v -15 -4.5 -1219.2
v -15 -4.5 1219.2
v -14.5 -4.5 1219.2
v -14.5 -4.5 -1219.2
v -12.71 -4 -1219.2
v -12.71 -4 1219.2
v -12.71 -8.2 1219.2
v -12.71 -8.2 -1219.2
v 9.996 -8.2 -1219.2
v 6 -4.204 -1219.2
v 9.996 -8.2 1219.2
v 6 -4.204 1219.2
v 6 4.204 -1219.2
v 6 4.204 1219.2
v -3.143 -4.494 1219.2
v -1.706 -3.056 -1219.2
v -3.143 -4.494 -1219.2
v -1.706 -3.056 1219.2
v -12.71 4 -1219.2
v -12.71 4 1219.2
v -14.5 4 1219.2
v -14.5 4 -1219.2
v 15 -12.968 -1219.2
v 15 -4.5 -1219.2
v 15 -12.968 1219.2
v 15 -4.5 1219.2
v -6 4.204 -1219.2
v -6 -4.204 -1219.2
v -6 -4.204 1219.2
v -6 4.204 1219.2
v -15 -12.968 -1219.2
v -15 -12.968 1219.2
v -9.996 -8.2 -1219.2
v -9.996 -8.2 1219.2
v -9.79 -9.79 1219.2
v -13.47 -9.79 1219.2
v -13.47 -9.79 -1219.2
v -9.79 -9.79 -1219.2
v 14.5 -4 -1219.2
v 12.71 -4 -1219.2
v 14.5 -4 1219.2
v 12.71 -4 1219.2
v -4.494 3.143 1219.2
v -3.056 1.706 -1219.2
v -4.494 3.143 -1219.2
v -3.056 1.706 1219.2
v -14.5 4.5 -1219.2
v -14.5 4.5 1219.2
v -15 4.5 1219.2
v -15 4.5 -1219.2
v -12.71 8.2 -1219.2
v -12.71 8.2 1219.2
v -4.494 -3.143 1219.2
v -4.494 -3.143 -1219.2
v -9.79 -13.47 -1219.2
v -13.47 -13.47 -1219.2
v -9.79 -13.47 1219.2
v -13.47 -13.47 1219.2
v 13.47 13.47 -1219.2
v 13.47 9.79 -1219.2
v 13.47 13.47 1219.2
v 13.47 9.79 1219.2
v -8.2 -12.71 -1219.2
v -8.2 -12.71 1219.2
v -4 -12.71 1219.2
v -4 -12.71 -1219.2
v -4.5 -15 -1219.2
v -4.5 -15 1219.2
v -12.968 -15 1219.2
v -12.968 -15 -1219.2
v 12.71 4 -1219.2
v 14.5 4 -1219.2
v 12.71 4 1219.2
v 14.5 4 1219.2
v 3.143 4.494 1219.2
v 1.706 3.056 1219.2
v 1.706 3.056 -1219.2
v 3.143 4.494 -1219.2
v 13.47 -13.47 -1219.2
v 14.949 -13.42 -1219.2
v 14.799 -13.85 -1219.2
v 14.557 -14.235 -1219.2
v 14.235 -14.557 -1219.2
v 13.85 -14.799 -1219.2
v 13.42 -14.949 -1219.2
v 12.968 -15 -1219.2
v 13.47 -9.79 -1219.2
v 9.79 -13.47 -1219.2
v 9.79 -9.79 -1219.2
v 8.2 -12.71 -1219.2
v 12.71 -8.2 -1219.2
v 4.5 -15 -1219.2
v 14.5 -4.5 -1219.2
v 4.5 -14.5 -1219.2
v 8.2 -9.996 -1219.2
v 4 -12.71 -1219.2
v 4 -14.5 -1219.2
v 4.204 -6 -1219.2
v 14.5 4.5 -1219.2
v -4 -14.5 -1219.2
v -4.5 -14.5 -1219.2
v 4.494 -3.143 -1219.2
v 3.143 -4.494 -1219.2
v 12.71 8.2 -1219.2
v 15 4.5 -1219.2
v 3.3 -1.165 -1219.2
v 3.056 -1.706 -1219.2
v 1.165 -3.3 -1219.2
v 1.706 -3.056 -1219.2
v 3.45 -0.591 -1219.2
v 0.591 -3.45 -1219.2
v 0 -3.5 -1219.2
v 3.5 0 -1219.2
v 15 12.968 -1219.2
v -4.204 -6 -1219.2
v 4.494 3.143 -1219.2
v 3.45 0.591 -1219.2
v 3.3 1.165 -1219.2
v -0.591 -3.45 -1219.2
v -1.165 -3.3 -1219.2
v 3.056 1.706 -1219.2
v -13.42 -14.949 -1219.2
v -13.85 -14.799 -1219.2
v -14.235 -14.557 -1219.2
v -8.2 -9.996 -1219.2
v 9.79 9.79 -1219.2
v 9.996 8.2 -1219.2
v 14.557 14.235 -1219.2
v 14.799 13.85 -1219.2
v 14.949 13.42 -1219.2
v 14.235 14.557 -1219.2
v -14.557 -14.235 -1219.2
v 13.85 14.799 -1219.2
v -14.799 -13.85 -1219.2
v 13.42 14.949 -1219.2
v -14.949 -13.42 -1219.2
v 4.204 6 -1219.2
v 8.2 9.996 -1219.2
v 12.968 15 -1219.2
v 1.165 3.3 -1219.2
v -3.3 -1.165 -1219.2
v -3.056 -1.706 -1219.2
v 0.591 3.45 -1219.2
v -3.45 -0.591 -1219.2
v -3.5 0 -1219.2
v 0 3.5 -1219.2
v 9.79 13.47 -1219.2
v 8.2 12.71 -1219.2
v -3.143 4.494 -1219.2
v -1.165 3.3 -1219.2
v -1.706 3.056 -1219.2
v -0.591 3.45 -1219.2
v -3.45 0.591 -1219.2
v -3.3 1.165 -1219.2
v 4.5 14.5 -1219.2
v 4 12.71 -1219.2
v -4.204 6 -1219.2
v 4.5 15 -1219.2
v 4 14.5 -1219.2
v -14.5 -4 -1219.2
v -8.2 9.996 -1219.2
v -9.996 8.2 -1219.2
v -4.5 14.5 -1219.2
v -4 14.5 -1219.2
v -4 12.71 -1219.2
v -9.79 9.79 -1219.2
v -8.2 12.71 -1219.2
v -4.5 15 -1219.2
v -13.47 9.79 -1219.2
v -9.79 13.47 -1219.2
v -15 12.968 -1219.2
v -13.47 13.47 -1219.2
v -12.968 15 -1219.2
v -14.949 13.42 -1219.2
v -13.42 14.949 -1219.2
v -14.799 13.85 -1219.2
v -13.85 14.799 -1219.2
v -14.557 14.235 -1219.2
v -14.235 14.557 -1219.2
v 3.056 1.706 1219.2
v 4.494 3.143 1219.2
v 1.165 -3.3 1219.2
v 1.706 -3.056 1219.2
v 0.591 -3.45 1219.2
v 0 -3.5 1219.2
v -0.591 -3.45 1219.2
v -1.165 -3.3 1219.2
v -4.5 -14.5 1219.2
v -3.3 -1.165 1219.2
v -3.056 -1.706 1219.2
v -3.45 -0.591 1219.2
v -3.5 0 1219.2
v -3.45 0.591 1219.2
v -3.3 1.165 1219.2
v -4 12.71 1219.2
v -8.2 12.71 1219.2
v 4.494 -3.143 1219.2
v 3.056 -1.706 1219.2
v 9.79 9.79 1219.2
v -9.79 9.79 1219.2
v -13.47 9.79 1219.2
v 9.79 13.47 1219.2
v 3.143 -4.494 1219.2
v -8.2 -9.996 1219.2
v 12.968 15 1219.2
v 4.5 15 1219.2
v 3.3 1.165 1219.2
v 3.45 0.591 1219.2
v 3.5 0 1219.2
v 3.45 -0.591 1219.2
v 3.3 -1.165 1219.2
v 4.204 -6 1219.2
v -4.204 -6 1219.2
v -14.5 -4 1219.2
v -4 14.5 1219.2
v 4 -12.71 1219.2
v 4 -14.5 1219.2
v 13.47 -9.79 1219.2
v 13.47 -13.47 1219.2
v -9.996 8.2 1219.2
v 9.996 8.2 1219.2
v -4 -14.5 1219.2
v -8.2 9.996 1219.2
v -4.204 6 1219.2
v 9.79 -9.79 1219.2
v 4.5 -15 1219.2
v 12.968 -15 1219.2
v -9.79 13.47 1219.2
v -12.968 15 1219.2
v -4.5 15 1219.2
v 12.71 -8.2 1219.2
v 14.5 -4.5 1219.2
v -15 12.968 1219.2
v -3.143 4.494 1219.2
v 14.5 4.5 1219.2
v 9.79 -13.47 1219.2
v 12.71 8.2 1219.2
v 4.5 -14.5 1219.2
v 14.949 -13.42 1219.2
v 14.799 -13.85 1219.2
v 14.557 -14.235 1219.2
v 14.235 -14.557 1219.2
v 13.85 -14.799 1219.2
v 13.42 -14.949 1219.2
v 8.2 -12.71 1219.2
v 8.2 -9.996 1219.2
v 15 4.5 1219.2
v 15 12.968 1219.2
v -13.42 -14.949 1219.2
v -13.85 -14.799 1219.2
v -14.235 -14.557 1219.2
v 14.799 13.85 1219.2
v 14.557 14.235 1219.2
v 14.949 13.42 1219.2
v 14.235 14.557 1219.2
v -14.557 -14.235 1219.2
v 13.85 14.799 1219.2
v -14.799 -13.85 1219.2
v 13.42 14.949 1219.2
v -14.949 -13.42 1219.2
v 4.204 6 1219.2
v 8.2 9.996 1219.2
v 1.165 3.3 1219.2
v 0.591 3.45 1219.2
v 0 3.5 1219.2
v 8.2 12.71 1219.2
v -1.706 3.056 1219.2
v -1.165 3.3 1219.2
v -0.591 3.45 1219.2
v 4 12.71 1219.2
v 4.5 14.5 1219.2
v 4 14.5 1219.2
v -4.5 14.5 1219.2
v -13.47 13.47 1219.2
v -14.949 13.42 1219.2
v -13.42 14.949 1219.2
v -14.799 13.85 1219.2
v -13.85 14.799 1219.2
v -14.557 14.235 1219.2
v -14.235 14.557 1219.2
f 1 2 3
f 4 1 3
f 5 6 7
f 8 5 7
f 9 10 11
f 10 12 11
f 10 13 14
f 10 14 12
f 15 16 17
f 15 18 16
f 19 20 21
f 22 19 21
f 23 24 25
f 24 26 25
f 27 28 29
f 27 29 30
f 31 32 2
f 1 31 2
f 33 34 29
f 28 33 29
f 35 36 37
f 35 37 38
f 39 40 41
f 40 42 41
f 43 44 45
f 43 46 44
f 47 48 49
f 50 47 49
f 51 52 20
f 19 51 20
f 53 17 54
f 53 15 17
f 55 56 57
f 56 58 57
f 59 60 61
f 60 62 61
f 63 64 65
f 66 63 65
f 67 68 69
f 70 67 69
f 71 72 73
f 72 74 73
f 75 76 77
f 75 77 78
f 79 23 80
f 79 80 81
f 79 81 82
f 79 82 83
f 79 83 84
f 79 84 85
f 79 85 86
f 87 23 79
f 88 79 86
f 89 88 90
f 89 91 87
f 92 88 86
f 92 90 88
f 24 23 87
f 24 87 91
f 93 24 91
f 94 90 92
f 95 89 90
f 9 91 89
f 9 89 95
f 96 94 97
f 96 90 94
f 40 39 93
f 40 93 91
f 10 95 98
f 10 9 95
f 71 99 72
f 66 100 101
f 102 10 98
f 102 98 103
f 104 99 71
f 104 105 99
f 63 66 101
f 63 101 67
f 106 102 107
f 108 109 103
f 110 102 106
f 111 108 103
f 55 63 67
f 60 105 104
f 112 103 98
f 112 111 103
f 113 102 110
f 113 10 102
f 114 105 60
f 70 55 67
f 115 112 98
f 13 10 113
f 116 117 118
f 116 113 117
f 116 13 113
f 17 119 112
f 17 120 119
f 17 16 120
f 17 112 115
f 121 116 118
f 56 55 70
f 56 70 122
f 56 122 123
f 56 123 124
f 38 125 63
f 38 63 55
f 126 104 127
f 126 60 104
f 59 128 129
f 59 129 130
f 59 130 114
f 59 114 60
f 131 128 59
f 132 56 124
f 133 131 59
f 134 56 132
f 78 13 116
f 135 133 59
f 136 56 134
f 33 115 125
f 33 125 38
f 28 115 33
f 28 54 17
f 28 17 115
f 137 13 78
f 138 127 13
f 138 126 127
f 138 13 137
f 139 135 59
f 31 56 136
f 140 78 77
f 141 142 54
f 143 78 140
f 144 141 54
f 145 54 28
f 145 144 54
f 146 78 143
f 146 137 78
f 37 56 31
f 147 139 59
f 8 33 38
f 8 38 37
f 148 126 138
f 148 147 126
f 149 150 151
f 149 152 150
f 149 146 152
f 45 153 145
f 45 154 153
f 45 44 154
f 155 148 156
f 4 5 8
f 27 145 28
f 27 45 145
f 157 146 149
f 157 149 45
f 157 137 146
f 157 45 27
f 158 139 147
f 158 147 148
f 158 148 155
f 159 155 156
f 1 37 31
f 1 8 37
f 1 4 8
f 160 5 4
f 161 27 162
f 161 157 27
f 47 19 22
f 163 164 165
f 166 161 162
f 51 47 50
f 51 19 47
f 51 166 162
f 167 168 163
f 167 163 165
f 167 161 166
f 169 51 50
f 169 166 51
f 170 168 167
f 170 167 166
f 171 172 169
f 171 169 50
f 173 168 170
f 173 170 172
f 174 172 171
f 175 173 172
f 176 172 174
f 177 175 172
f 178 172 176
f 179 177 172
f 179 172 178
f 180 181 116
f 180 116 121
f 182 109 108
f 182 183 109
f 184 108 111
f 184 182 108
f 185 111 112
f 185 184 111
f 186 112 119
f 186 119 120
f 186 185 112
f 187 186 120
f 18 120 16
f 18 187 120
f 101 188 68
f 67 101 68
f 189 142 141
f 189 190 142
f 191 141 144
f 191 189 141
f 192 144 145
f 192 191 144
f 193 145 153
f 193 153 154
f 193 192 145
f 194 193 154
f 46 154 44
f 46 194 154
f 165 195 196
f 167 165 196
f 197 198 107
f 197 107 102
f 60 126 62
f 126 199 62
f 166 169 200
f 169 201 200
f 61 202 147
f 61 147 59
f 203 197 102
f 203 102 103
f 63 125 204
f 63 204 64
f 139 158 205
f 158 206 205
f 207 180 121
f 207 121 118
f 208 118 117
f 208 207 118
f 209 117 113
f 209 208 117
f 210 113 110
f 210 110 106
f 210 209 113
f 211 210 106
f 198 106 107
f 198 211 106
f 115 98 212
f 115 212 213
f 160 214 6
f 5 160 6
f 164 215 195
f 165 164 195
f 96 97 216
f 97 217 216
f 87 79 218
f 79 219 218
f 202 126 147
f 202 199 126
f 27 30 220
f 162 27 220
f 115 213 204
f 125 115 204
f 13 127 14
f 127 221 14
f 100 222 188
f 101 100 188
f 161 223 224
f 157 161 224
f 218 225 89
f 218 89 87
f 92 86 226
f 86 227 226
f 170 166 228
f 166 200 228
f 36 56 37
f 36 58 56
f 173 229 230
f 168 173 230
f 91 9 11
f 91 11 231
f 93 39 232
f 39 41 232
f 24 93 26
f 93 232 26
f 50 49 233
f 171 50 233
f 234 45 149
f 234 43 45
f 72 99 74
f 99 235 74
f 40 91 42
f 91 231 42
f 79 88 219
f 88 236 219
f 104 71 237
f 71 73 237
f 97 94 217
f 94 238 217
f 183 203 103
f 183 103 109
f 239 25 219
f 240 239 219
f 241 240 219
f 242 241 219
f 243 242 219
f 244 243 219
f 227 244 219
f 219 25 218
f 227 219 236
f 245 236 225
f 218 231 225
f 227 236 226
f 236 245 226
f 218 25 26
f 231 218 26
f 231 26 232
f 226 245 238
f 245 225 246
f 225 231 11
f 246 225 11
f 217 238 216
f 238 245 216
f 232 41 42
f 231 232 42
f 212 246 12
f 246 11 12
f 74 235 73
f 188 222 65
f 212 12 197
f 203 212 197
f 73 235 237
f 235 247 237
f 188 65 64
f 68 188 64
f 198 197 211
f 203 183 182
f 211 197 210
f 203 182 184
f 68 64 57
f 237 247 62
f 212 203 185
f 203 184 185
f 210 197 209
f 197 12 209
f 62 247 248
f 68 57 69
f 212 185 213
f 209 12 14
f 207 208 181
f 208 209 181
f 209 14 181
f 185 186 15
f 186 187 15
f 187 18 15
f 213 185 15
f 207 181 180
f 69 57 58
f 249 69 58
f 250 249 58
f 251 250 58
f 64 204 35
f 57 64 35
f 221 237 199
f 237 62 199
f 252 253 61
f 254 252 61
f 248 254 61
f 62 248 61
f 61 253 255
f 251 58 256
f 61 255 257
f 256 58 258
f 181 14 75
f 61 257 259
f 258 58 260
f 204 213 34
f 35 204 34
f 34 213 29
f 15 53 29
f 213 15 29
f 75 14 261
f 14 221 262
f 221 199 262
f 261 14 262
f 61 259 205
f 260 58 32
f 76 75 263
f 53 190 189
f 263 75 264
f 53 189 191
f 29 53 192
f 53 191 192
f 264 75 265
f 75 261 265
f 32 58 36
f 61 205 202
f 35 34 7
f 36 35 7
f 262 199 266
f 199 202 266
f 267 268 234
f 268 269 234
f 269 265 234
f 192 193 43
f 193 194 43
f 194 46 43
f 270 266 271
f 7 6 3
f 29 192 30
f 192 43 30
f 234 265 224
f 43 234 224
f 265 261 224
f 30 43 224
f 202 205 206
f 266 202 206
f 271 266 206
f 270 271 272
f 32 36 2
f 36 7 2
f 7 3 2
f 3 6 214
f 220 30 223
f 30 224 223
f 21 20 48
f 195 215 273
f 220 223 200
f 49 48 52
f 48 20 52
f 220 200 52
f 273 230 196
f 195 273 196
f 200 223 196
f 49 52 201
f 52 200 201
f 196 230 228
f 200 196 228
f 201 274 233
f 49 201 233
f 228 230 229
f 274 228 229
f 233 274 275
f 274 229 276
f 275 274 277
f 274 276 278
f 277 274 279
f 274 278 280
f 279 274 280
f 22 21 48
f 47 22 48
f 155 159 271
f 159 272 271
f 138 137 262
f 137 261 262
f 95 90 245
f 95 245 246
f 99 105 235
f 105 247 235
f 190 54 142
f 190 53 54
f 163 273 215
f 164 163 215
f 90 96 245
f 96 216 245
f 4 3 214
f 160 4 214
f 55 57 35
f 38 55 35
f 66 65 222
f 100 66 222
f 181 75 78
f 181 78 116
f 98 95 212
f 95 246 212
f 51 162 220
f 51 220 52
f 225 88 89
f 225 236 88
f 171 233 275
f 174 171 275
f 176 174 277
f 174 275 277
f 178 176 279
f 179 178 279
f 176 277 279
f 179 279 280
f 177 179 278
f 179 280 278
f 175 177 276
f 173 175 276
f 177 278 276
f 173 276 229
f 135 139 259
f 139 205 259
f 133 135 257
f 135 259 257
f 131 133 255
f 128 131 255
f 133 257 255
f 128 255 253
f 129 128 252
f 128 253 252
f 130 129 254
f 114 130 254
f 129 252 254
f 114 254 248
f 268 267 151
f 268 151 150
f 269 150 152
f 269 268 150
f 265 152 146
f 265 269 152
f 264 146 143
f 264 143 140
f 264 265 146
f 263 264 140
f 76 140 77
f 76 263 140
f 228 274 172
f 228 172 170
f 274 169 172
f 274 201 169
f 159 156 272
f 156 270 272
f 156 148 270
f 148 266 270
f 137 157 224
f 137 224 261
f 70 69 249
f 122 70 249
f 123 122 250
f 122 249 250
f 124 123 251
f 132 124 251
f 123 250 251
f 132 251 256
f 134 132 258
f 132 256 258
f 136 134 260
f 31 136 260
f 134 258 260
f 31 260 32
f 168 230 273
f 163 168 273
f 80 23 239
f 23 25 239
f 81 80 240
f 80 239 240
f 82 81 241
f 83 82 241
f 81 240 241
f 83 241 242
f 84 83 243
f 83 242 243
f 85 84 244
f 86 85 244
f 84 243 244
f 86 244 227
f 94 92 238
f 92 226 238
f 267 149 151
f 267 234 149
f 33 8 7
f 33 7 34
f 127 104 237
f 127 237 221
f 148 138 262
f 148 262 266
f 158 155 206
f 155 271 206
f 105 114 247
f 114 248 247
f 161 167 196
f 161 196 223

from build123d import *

# Parameters (mm, degrees)
SKETCH3_W           = 3.68
SKETCH3_H           = 3.68
BOSS_EXTRUDE1_DEPTH = 1219.2


with BuildPart() as part:
    # Sketch3 → Boss-Extrude1 (new, symmetric)
    with BuildSketch(Plane.XY):
        with BuildLine():
            Line((-4.203948776, 6), (0, 6))
            Line((0, 6), (4.203948776, 6))
            Line((4.203948776, 6), (8.2, 9.996051224))
            Line((8.2, 9.996051224), (8.2, 12.71))
            Line((8.2, 12.71), (4, 12.71))
            Line((4, 12.71), (4, 14.5))
            Line((4, 14.5), (4.5, 14.5))
            Line((4.5, 14.5), (4.5, 15))
            Line((4.5, 15), (12.968, 15))
            ThreePointArc((12.968, 15), (14.404840979, 14.404840979), (15, 12.968))
            Line((15, 12.968), (15, 4.5))
            Line((15, 4.5), (14.5, 4.5))
            Line((14.5, 4.5), (14.5, 4))
            Line((14.5, 4), (12.71, 4))
            Line((12.71, 4), (12.71, 8.2))
            Line((12.71, 8.2), (9.996051224, 8.2))
            Line((9.996051224, 8.2), (6, 4.203948776))
            Line((6, 4.203948776), (6, 0))
            Line((6, 0), (6, -4.203948776))
            Line((6, -4.203948776), (9.996051224, -8.2))
            Line((9.996051224, -8.2), (12.71, -8.2))
            Line((12.71, -8.2), (12.71, -4))
            Line((12.71, -4), (14.5, -4))
            Line((14.5, -4), (14.5, -4.5))
            Line((14.5, -4.5), (15, -4.5))
            Line((15, -4.5), (15, -12.968))
            ThreePointArc((15, -12.968), (14.404840979, -14.404840979), (12.968, -15))
            Line((12.968, -15), (4.5, -15))
            Line((4.5, -15), (4.5, -14.5))
            Line((4.5, -14.5), (4, -14.5))
            Line((4, -14.5), (4, -12.71))
            Line((4, -12.71), (8.2, -12.71))
            Line((8.2, -12.71), (8.2, -9.996051224))
            Line((8.2, -9.996051224), (4.203948776, -6))
            Line((4.203948776, -6), (0, -6))
            Line((0, -6), (-4.203948776, -6))
            Line((-4.203948776, -6), (-8.2, -9.996051224))
            Line((-8.2, -9.996051224), (-8.2, -12.71))
            Line((-8.2, -12.71), (-4, -12.71))
            Line((-4, -12.71), (-4, -14.5))
            Line((-4, -14.5), (-4.5, -14.5))
            Line((-4.5, -14.5), (-4.5, -15))
            Line((-4.5, -15), (-12.968, -15))
            ThreePointArc((-12.968, -15), (-14.404840979, -14.404840979), (-15, -12.968))
            Line((-15, -12.968), (-15, -4.5))
            Line((-15, -4.5), (-14.5, -4.5))
            Line((-14.5, -4.5), (-14.5, -4))
            Line((-14.5, -4), (-12.71, -4))
            Line((-12.71, -4), (-12.71, -8.2))
            Line((-12.71, -8.2), (-9.996051224, -8.2))
            Line((-9.996051224, -8.2), (-6, -4.203948776))
            Line((-6, -4.203948776), (-6, 0))
            Line((-6, 0), (-6, 4.203948776))
            Line((-6, 4.203948776), (-9.996051224, 8.2))
            Line((-9.996051224, 8.2), (-12.71, 8.2))
            Line((-12.71, 8.2), (-12.71, 4))
            Line((-12.71, 4), (-14.5, 4))
            Line((-14.5, 4), (-14.5, 4.5))
            Line((-14.5, 4.5), (-15, 4.5))
            Line((-15, 4.5), (-15, 12.968))
            ThreePointArc((-15, 12.968), (-14.404840979, 14.404840979), (-12.968, 15))
            Line((-12.968, 15), (-4.5, 15))
            Line((-4.5, 15), (-4.5, 14.5))
            Line((-4.5, 14.5), (-4, 14.5))
            Line((-4, 14.5), (-4, 12.71))
            Line((-4, 12.71), (-8.2, 12.71))
            Line((-8.2, 12.71), (-8.2, 9.996051224))
            Line((-8.2, 9.996051224), (-4.203948776, 6))
        make_face()
        with Locations((-11.63, 11.63)):
            Rectangle(SKETCH3_W, SKETCH3_H, mode=Mode.SUBTRACT)
        with BuildLine():
            Line((-3.143089642, 4.493663594), (-1.705676589, 3.056250541))
            ThreePointArc((-1.705676589, 3.056250541), (0, 3.5), (1.705676589, 3.056250541))
            Line((1.705676589, 3.056250541), (3.143089642, 4.493663594))
            Line((3.143089642, 4.493663594), (4.493663594, 3.143089642))
            Line((4.493663594, 3.143089642), (3.056250541, 1.705676589))
            ThreePointArc((3.056250541, 1.705676589), (3.5, 0), (3.056250541, -1.705676589))
            Line((3.056250541, -1.705676589), (4.493663594, -3.143089642))
            Line((4.493663594, -3.143089642), (3.143089642, -4.493663594))
            Line((3.143089642, -4.493663594), (1.705676589, -3.056250541))
            ThreePointArc((1.705676589, -3.056250541), (0, -3.5), (-1.705676589, -3.056250541))
            Line((-1.705676589, -3.056250541), (-3.143089642, -4.493663594))
            Line((-3.143089642, -4.493663594), (-4.493663594, -3.143089642))
            Line((-4.493663594, -3.143089642), (-3.056250541, -1.705676589))
            ThreePointArc((-3.056250541, -1.705676589), (-3.5, 0), (-3.056250541, 1.705676589))
            Line((-3.056250541, 1.705676589), (-4.493663594, 3.143089642))
            Line((-4.493663594, 3.143089642), (-3.143089642, 4.493663594))
        make_face(mode=Mode.SUBTRACT)
        with Locations((11.63, 11.63)):
            Rectangle(SKETCH3_W, SKETCH3_H, mode=Mode.SUBTRACT)
        with Locations((11.63, -11.63)):
            Rectangle(SKETCH3_W, SKETCH3_H, mode=Mode.SUBTRACT)
        with Locations((-11.63, -11.63)):
            Rectangle(SKETCH3_W, SKETCH3_H, mode=Mode.SUBTRACT)
    extrude(amount=BOSS_EXTRUDE1_DEPTH, both=True)


solid = part.part
